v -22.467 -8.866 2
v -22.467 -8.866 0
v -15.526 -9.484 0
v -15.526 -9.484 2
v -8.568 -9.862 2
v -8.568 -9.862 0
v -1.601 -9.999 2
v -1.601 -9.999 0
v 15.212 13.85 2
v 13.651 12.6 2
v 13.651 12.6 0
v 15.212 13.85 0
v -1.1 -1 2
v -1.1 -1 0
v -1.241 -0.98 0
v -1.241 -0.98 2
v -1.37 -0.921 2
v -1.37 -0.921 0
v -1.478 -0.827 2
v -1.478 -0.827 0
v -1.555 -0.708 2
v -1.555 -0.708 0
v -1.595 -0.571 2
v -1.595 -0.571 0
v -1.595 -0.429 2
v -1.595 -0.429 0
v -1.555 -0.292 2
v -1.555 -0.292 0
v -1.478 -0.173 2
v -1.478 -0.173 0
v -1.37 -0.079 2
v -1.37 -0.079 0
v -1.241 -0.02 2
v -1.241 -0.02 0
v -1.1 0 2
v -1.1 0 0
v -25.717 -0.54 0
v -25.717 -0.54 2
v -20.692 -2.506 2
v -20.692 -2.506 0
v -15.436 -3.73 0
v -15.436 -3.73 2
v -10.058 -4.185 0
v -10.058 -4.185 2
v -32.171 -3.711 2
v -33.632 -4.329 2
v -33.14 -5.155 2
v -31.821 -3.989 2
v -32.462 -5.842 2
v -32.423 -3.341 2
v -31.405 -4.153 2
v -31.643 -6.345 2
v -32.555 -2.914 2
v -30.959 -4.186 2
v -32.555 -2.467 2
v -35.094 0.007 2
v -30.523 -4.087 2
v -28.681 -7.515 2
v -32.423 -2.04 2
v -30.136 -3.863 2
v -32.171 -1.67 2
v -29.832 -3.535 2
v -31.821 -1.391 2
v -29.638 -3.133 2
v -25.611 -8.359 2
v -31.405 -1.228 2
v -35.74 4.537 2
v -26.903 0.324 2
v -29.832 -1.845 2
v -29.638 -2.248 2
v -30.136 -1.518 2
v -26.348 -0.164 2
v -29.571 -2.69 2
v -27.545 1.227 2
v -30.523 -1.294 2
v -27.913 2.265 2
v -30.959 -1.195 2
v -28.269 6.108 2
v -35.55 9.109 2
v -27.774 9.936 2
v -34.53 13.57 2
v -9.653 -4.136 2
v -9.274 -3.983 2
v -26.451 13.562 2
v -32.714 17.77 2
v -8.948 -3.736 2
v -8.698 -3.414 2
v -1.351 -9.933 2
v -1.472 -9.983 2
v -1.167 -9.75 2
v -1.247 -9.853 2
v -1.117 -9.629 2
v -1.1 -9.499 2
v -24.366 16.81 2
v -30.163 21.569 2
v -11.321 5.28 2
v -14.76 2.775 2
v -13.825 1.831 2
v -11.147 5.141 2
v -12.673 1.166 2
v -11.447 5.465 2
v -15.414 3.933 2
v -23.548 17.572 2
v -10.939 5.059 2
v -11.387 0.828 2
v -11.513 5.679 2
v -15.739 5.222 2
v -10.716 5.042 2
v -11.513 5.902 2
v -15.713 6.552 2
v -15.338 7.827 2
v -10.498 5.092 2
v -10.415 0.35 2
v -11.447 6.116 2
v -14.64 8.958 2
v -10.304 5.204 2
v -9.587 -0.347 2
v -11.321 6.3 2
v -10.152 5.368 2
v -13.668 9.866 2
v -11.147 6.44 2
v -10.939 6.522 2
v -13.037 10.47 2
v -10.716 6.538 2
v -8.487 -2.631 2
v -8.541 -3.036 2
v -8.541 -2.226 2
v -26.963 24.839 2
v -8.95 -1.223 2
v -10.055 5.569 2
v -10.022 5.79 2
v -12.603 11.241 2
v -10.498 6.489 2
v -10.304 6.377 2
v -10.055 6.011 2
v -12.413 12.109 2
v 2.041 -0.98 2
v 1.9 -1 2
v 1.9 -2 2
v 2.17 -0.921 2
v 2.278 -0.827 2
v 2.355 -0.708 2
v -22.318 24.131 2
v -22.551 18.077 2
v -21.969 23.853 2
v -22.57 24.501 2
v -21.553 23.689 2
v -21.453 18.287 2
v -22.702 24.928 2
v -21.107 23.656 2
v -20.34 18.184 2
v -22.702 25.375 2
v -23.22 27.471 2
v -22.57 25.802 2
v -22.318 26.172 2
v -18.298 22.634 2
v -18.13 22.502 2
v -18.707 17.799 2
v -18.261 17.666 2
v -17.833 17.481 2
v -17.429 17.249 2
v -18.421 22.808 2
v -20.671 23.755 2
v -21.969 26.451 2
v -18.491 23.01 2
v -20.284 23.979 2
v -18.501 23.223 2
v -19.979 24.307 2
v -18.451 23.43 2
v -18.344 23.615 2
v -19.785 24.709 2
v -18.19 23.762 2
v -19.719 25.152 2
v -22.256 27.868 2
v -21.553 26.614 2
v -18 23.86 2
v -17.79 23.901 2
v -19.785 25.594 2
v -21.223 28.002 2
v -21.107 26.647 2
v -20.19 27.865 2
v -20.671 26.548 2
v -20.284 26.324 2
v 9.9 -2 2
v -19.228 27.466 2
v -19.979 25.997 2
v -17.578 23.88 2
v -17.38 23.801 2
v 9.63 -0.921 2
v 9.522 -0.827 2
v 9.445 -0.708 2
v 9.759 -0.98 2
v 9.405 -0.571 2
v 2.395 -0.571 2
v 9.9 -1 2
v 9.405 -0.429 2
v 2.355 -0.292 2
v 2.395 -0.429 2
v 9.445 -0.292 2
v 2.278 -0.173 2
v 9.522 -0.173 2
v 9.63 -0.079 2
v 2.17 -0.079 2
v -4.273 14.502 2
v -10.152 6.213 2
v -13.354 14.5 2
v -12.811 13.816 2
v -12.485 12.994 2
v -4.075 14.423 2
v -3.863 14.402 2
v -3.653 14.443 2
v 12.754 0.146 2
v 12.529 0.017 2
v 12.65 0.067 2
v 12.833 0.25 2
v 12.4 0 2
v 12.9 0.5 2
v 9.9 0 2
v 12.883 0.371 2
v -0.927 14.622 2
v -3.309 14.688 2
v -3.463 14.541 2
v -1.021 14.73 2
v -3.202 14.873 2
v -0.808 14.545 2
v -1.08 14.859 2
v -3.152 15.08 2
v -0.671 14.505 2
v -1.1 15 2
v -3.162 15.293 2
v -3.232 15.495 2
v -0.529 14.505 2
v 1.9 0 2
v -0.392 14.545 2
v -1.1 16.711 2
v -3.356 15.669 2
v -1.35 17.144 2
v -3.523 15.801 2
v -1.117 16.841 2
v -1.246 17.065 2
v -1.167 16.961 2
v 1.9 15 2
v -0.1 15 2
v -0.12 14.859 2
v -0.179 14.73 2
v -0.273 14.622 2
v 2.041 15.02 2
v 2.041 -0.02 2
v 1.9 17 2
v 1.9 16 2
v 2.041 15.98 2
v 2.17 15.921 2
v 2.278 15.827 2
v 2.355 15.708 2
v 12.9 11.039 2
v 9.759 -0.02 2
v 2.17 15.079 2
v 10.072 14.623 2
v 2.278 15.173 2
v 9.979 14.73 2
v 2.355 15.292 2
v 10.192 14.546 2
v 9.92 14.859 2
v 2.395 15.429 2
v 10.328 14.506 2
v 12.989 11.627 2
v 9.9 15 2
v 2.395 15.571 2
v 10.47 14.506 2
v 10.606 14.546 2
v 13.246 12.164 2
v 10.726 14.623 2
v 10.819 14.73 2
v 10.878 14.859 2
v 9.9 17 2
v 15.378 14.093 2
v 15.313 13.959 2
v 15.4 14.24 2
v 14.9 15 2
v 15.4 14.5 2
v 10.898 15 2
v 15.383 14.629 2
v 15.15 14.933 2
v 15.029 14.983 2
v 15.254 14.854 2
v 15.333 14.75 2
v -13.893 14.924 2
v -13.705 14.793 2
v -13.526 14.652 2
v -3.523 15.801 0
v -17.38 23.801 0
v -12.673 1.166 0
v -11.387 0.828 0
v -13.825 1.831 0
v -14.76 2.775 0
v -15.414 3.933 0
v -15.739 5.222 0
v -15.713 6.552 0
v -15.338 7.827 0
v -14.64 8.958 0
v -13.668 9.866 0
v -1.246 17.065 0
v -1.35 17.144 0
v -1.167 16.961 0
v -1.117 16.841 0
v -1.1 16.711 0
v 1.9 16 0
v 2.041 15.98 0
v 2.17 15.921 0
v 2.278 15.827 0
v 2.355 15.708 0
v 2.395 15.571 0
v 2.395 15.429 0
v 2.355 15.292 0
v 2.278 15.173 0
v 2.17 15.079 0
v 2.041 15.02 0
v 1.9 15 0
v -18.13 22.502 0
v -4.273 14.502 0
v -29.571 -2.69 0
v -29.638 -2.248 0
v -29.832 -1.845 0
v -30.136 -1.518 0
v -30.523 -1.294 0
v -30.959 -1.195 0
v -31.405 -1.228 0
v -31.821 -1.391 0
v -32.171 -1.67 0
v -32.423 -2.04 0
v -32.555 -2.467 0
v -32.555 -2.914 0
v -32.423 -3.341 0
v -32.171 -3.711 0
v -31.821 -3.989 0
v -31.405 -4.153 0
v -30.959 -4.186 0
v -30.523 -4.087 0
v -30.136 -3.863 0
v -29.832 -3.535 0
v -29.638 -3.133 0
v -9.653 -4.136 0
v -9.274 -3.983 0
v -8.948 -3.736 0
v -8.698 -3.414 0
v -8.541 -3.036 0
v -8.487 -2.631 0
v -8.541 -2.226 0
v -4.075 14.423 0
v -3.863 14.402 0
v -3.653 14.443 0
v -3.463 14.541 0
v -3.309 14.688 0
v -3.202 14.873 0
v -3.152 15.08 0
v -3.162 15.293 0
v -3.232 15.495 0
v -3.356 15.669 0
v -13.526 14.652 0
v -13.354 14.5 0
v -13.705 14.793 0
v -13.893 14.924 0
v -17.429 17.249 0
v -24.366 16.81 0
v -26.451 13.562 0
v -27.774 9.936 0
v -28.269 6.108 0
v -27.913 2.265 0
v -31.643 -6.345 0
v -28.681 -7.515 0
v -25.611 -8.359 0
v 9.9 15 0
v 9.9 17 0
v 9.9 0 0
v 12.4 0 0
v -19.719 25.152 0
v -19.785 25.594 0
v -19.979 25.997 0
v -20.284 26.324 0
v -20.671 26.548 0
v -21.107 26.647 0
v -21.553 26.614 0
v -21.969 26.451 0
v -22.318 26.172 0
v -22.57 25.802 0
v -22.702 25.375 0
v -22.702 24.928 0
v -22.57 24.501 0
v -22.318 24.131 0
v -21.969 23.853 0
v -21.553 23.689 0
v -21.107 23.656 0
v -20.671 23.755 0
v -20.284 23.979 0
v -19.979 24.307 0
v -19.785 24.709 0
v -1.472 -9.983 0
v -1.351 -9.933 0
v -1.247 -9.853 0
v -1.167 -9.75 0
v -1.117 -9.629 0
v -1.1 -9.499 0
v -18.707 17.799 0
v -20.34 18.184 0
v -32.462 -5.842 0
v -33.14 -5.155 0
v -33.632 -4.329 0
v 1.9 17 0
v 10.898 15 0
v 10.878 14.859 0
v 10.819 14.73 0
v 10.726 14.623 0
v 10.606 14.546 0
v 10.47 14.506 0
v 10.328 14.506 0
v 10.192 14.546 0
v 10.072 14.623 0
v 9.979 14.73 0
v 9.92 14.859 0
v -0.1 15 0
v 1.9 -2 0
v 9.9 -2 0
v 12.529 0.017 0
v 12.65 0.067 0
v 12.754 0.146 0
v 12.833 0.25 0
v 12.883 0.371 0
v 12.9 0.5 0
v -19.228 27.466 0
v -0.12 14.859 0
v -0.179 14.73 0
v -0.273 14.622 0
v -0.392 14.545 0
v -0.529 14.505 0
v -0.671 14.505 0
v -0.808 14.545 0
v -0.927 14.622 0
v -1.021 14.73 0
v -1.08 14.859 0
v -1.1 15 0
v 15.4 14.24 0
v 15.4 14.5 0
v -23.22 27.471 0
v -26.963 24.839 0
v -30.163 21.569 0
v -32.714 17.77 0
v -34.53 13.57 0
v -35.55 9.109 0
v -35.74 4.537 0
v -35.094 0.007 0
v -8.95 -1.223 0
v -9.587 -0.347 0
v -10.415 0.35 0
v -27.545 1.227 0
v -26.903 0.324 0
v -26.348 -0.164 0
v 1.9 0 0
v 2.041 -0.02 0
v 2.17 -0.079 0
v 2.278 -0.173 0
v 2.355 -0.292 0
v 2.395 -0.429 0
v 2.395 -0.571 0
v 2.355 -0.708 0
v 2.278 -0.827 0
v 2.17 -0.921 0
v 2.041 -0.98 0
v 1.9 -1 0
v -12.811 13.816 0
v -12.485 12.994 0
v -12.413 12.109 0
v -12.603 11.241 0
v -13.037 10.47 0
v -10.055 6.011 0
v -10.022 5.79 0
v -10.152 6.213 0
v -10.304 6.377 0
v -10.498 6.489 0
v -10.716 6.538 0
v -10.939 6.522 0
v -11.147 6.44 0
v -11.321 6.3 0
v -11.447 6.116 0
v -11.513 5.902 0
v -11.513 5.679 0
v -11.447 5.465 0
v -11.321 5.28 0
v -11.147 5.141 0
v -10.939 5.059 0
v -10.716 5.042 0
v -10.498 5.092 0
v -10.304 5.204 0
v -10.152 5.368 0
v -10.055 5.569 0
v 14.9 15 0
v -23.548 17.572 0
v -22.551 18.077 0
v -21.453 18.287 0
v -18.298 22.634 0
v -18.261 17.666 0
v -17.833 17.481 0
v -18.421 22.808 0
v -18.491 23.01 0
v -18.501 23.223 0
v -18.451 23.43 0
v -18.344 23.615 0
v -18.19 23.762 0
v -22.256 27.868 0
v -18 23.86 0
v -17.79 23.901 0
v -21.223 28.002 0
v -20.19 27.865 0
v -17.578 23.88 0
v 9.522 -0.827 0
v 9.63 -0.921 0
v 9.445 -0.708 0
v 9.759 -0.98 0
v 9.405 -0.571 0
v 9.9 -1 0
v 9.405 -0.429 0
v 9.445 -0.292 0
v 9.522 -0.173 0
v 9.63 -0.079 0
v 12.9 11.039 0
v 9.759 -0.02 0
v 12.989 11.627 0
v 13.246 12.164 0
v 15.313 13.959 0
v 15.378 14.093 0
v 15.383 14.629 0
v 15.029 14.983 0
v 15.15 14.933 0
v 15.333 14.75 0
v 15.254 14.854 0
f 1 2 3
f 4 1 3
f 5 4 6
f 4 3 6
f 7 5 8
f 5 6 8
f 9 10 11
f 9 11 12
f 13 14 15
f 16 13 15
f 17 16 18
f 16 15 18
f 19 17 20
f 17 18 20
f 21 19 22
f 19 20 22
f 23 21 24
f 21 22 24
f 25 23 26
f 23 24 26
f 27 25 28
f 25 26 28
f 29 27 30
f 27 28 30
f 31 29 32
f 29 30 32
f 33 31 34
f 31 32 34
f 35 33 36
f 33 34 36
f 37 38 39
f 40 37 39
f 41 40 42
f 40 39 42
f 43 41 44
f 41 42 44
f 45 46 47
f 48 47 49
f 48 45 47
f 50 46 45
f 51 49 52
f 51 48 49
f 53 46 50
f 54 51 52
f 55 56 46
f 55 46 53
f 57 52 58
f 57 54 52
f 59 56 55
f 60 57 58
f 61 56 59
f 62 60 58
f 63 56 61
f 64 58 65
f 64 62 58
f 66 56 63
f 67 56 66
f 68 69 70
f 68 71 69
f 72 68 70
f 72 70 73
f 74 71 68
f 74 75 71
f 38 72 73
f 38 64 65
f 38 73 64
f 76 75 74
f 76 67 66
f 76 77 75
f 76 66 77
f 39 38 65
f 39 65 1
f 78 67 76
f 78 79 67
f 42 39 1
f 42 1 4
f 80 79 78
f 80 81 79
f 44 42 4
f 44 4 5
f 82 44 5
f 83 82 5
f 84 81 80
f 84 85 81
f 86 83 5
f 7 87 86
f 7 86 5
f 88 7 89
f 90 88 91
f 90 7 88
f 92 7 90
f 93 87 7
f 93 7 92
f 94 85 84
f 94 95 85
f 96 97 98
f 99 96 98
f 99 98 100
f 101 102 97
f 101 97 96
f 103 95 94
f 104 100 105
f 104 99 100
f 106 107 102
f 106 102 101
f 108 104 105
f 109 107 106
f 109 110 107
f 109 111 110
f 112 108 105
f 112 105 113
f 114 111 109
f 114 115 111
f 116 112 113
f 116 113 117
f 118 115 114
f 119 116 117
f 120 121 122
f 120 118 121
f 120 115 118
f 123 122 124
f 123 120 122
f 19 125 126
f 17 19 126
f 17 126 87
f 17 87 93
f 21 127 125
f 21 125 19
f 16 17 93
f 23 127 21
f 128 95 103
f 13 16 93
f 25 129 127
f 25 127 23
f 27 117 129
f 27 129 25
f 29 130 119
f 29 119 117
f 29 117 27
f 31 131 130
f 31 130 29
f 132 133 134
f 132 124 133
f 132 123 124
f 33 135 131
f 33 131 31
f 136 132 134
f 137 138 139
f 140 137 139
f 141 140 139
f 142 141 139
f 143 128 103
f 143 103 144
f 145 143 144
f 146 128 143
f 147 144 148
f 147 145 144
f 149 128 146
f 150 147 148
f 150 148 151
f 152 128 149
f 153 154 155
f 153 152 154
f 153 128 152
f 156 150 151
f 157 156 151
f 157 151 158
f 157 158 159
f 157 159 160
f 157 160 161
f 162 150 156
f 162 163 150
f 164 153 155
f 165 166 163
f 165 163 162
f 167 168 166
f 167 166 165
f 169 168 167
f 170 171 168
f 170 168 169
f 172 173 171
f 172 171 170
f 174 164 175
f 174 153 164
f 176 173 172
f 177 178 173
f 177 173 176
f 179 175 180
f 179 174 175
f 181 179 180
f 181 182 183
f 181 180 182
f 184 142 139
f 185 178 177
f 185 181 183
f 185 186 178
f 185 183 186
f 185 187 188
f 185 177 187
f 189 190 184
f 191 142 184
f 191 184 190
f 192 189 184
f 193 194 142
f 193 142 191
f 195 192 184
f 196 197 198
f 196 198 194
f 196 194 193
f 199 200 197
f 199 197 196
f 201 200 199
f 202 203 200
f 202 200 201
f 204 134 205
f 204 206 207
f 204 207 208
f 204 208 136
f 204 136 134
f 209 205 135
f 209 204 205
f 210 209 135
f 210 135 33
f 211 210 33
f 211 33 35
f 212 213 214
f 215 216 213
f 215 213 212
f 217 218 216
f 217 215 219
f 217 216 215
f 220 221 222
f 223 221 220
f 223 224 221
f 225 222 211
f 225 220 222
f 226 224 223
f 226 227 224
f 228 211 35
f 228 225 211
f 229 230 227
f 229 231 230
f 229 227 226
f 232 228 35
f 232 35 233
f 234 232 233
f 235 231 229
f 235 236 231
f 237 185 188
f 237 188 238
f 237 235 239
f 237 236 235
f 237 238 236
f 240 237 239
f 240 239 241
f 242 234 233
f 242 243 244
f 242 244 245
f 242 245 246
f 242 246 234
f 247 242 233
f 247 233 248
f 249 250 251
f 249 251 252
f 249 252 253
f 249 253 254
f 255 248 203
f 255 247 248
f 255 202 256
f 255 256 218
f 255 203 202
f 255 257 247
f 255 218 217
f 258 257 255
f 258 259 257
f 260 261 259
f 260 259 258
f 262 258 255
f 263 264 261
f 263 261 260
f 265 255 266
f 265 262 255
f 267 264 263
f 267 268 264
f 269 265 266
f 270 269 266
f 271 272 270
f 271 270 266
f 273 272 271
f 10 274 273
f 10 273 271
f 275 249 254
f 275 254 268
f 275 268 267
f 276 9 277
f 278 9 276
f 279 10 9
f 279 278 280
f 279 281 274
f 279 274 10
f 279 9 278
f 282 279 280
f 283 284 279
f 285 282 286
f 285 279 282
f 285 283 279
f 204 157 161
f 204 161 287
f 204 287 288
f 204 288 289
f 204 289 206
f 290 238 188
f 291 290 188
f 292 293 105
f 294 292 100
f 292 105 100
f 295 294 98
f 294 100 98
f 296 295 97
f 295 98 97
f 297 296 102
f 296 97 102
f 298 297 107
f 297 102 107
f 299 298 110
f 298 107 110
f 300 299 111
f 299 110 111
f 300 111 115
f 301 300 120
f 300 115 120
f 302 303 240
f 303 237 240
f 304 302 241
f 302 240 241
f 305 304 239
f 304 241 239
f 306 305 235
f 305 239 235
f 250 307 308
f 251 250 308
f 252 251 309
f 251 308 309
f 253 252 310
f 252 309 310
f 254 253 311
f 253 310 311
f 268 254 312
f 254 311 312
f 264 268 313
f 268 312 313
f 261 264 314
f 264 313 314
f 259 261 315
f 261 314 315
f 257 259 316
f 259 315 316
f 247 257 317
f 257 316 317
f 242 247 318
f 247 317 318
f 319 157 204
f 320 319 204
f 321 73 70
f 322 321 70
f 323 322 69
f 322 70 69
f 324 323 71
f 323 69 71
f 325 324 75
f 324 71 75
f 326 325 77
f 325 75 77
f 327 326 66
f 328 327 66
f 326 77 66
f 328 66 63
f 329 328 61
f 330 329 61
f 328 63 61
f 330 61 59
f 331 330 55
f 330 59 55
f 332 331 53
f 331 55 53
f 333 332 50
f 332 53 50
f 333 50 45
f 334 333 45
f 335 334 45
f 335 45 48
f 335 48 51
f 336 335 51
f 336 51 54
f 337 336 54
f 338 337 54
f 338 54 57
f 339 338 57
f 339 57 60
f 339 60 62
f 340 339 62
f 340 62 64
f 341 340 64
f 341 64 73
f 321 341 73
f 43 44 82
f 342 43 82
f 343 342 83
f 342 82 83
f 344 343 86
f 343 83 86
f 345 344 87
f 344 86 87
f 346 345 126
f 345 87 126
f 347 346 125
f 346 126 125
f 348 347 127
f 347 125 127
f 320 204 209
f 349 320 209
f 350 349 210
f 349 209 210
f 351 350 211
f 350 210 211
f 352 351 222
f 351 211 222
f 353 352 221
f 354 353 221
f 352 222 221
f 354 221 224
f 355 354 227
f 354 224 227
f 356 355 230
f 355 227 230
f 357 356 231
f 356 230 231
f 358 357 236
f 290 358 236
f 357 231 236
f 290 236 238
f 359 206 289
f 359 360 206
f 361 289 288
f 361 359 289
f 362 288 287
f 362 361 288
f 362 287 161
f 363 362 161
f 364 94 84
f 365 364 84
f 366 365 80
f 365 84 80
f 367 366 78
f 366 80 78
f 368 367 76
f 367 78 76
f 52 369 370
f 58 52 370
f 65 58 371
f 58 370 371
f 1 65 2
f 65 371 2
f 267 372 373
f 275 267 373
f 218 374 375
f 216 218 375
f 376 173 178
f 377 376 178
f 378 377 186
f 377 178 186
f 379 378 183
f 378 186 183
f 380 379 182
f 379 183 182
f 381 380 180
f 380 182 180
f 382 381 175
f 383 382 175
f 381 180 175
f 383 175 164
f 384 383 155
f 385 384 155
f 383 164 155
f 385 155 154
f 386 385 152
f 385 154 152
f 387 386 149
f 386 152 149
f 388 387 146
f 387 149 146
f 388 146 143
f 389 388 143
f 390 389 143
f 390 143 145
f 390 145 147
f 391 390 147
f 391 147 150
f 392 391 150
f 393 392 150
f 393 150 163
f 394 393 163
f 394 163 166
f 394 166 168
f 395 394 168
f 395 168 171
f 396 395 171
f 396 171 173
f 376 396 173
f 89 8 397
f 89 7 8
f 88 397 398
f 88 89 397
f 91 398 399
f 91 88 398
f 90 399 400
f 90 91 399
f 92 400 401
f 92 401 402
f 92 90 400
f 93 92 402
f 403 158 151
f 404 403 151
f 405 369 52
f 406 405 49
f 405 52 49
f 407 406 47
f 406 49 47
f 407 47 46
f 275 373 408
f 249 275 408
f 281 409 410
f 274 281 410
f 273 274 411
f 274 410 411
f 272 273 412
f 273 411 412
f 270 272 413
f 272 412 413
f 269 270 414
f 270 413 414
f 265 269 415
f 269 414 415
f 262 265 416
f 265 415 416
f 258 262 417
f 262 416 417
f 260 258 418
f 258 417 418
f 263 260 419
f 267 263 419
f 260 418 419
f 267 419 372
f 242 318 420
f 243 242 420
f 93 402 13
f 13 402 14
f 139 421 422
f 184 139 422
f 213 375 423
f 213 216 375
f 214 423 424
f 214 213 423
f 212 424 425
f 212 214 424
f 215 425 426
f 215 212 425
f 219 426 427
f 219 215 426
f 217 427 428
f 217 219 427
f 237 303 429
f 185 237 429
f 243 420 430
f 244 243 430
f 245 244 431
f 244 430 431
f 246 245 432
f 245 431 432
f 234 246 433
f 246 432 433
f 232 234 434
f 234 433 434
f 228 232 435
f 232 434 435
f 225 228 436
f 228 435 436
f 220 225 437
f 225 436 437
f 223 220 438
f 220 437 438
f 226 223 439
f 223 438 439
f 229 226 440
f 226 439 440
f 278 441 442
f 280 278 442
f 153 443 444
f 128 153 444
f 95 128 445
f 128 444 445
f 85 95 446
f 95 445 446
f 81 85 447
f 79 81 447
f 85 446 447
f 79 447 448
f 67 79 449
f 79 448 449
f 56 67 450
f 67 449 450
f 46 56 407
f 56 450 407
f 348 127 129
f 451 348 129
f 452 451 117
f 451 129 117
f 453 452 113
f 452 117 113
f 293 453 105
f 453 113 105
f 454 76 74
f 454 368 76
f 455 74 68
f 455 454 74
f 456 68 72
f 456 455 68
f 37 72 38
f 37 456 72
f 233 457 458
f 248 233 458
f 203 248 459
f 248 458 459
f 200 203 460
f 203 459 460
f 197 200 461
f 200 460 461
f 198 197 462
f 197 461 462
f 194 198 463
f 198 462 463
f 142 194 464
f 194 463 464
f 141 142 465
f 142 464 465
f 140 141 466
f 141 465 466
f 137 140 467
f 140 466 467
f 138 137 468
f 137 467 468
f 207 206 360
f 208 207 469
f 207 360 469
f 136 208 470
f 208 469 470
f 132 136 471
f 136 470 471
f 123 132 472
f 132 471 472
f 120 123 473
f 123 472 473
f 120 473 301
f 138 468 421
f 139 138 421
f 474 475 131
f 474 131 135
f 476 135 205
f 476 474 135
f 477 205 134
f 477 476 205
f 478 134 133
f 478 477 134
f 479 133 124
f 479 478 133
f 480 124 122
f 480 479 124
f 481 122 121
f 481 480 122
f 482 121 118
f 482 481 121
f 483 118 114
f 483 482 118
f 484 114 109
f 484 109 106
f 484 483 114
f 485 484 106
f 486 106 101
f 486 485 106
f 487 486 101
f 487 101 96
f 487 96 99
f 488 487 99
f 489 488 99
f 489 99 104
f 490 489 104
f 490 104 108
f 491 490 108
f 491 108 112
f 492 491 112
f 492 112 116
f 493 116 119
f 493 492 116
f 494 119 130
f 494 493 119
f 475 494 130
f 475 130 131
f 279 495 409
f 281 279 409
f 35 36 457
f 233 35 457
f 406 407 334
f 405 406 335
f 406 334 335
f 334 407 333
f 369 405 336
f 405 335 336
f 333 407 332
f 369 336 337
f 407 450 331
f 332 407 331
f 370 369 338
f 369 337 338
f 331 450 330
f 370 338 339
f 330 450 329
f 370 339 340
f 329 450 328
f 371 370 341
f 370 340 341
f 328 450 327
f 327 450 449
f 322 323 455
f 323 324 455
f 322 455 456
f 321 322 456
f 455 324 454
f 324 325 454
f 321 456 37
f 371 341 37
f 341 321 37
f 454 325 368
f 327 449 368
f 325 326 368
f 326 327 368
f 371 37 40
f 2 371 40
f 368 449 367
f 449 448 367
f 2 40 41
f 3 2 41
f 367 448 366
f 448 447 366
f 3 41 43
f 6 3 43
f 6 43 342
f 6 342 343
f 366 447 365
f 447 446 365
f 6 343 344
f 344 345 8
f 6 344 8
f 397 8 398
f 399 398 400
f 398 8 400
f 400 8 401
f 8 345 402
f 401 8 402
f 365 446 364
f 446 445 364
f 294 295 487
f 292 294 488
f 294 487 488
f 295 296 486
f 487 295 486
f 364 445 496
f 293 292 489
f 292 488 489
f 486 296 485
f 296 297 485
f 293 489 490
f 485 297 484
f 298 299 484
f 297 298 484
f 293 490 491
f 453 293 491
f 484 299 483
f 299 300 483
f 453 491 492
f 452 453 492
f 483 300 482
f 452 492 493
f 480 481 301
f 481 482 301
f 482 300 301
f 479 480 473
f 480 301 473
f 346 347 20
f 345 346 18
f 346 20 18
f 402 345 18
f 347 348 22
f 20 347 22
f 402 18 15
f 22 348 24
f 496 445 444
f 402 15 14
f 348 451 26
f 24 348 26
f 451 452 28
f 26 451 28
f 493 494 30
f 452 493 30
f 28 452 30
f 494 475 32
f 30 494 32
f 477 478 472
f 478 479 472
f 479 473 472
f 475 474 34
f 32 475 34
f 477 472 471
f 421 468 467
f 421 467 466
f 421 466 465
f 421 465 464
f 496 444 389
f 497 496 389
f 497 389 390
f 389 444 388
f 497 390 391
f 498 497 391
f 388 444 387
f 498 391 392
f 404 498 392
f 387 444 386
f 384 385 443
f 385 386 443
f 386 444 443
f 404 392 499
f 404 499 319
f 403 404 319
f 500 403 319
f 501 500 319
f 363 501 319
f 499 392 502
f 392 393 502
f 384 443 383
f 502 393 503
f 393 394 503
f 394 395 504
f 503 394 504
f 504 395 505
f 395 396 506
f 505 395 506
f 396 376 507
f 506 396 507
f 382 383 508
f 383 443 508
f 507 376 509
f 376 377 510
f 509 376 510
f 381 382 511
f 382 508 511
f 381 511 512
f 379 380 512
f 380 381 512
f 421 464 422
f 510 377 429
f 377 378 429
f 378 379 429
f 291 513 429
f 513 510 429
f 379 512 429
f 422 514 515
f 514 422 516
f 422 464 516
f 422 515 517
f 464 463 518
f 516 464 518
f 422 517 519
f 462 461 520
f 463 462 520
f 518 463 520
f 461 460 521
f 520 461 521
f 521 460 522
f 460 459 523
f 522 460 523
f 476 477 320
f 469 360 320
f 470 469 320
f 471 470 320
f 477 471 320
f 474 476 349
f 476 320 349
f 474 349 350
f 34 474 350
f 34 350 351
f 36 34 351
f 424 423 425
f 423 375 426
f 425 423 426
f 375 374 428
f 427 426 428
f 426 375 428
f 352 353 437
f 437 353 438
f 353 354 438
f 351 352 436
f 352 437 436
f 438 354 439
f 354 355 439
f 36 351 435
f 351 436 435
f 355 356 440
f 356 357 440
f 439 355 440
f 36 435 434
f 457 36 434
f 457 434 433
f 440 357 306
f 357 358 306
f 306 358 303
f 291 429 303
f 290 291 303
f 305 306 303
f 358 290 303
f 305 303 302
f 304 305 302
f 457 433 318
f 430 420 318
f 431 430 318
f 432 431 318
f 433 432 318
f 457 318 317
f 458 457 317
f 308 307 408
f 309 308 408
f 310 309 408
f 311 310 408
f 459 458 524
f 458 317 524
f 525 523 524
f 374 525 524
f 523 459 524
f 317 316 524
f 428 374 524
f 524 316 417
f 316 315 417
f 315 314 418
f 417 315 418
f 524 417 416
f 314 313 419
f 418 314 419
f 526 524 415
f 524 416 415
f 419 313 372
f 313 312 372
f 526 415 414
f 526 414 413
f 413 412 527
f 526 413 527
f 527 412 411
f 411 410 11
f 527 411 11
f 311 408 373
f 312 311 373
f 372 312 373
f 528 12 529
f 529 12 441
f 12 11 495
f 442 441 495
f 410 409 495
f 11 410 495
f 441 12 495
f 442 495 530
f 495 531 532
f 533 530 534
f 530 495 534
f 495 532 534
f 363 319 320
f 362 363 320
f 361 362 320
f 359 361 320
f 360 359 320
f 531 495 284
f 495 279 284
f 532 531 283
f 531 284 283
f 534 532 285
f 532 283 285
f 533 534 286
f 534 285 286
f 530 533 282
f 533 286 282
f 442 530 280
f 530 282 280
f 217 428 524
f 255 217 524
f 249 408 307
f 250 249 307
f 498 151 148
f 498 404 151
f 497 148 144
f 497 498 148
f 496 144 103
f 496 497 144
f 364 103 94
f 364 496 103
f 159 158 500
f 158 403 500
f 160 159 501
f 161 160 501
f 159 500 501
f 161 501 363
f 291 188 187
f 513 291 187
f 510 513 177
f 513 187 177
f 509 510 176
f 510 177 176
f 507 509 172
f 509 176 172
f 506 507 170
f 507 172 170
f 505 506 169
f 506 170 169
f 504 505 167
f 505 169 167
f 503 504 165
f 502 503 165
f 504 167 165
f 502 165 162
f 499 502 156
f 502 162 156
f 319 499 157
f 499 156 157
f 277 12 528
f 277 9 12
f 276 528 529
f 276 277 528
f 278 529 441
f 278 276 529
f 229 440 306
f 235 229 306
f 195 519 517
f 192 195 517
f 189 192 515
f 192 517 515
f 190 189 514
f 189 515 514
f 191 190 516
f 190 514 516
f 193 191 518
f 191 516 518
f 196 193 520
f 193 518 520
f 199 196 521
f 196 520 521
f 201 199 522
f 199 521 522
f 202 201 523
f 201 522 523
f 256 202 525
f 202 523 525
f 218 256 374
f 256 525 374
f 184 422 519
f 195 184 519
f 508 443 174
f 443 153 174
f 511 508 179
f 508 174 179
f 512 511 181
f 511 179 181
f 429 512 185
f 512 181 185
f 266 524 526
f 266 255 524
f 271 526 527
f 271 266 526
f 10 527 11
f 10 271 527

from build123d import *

# Parameters (mm, degrees)
SKETCH1_R           = 0.75
BOSS_EXTRUDE1_DEPTH = 2
FILLET7_R           = 4
FILLET8_R           = 0.5
FILLET9_R           = 2
SKETCH2_R           = 1.5
CUT_EXTRUDE1_DEPTH  = 46.472229495
FILLET10_R          = 4
FILLET12_R          = 3


with BuildPart() as part:
    # Sketch1 → Boss-Extrude1 (new body)
    with BuildSketch(Plane.XY):
        with BuildLine():
            ThreePointArc((9.900055809, -1), (9.400055809, -0.5), (9.900055809, 0))
            Line((9.900055809, 0), (12.900055809, 0))
            Line((12.900055809, 0), (12.900055809, 12))
            Line((12.900055809, 12), (15.400055809, 14))
            Line((15.400055809, 14), (15.400055809, 15))
            Line((15.400055809, 15), (10.898257816, 15))
            ThreePointArc((10.898257816, 15), (10.399156812, 14.500898997), (9.900055809, 15))
            Line((9.900055809, 15), (9.900055809, 17))
            Line((9.900055809, 17), (1.900055809, 17))
            Line((1.900055809, 17), (1.900055809, 16))
            ThreePointArc((1.900055809, 16), (2.400055809, 15.5), (1.900055809, 15))
            Line((1.900055809, 15), (-0.099944191, 15))
            ThreePointArc((-0.099944191, 15), (-0.599944191, 14.5), (-1.099944191, 15))
            Line((-1.099944191, 15), (-1.099944191, 17))
            Line((-1.099944191, 17), (-21.109742569, 28.55266248))
            ThreePointArc((-21.109742569, 28.55266248), (-34.392766222, 13.978204373), (-32.979517798, -5.690457894))
            ThreePointArc((-32.979517798, -5.690457894), (-27.872628368, -7.772375219), (-22.467282567, -8.866421))
            ThreePointArc((-22.467282567, -8.866421), (-11.79863746, -9.716406126), (-1.099944191, -10))
            Line((-1.099944191, -10), (-1.099944191, -1))
            ThreePointArc((-1.099944191, -1), (-1.599944191, -0.5), (-1.099944191, 0))
            Line((-1.099944191, 0), (1.900055809, 0))
            ThreePointArc((1.900055809, 0), (2.400055809, -0.5), (1.900055809, -1))
            Line((1.900055809, -1), (1.900055809, -2))
            Line((1.900055809, -2), (9.900055809, -2))
            Line((9.900055809, -2), (9.900055809, -1))
        make_face()
        with Locations((-10.771610825, 5.790346428)):
            Circle(SKETCH1_R, mode=Mode.SUBTRACT)
    extrude(amount=BOSS_EXTRUDE1_DEPTH)

    # Fillet7
    fillet7_edges = [part.edges().sort_by_distance(p)[0] for p in [
        (-32.979517798, -5.690457894, 1),
        (-21.109742569, 28.55266248, 1),
    ]]
    fillet(fillet7_edges, radius=FILLET7_R)

    # Fillet8
    fillet8_edges = [part.edges().sort_by_distance(p)[0] for p in [
        (-1.099944191, 17, 1),
        (15.400055809, 15, 1),
        (15.400055809, 14, 1),
        (12.900055809, 0, 1),
        (-1.099944191, -10, 1),
    ]]
    fillet(fillet8_edges, radius=FILLET8_R)

    # Fillet9
    fillet9_edges = [part.edges().sort_by_distance(p)[0] for p in [
        (12.900055809, 12, 1),
    ]]
    fillet(fillet9_edges, radius=FILLET9_R)

    # Sketch2 → Cut-Extrude1 (cut, through all)
    with BuildSketch(Plane.XY.offset(2)):
        with Locations((-21.218823002, 25.151538482)):
            Circle(SKETCH2_R)
        with Locations((-31.071264961, -2.690457894)):
            Circle(SKETCH2_R)
        with BuildLine():
            Line((-18.019584713, 17.636691368), (-22.57366805, 18.711702598))
            ThreePointArc((-22.57366805, 18.711702598), (-27.700823696, 10.223376044), (-27.391868807, 0.311566946))
            ThreePointArc((-27.391868807, 0.311566946), (-18.997839896, -2.988434266), (-10.058124429, -4.184768964))
            ThreePointArc((-10.058124429, -4.184768964), (-8.812200112, -3.583264873), (-8.54147164, -2.226489037))
            ThreePointArc((-8.54147164, -2.226489037), (-9.58655744, -0.347195343), (-11.387108468, 0.828374779))
            ThreePointArc((-11.387108468, 0.828374779), (-15.771507704, 5.758234049), (-11.450792663, 10.744002859))
            Line((-11.450792663, 10.744002859), (-12.839873731, 14.232317382))
            Line((-12.839873731, 14.232317382), (-18.019584713, 17.636691368))
        make_face()
        with BuildLine():
            Line((-18.129721387, 22.502019429), (-4.273314926, 14.502019429))
            ThreePointArc((-4.273314926, 14.502019429), (-3.248795873, 14.776538482), (-3.523314926, 15.801057535))
            Line((-3.523314926, 15.801057535), (-17.379721387, 23.801057535))
            ThreePointArc((-17.379721387, 23.801057535), (-18.404240439, 23.526538482), (-18.129721387, 22.502019429))
        make_face()
    extrude(amount=-CUT_EXTRUDE1_DEPTH, mode=Mode.SUBTRACT)

    # Fillet10
    fillet10_edges = [part.edges().sort_by_distance(p)[0] for p in [
        (-27.391868807, 0.311566946, 1),
        (-22.57366805, 18.711702598, 1),
        (-18.019584713, 17.636691368, 1),
        (-12.839873731, 14.232317382, 1),
    ]]
    fillet(fillet10_edges, radius=FILLET10_R)

    # Fillet12
    fillet12_edges = [part.edges().sort_by_distance(p)[0] for p in [
        (-11.450792663, 10.744002859, 1),
    ]]
    fillet(fillet12_edges, radius=FILLET12_R)


solid = part.part
